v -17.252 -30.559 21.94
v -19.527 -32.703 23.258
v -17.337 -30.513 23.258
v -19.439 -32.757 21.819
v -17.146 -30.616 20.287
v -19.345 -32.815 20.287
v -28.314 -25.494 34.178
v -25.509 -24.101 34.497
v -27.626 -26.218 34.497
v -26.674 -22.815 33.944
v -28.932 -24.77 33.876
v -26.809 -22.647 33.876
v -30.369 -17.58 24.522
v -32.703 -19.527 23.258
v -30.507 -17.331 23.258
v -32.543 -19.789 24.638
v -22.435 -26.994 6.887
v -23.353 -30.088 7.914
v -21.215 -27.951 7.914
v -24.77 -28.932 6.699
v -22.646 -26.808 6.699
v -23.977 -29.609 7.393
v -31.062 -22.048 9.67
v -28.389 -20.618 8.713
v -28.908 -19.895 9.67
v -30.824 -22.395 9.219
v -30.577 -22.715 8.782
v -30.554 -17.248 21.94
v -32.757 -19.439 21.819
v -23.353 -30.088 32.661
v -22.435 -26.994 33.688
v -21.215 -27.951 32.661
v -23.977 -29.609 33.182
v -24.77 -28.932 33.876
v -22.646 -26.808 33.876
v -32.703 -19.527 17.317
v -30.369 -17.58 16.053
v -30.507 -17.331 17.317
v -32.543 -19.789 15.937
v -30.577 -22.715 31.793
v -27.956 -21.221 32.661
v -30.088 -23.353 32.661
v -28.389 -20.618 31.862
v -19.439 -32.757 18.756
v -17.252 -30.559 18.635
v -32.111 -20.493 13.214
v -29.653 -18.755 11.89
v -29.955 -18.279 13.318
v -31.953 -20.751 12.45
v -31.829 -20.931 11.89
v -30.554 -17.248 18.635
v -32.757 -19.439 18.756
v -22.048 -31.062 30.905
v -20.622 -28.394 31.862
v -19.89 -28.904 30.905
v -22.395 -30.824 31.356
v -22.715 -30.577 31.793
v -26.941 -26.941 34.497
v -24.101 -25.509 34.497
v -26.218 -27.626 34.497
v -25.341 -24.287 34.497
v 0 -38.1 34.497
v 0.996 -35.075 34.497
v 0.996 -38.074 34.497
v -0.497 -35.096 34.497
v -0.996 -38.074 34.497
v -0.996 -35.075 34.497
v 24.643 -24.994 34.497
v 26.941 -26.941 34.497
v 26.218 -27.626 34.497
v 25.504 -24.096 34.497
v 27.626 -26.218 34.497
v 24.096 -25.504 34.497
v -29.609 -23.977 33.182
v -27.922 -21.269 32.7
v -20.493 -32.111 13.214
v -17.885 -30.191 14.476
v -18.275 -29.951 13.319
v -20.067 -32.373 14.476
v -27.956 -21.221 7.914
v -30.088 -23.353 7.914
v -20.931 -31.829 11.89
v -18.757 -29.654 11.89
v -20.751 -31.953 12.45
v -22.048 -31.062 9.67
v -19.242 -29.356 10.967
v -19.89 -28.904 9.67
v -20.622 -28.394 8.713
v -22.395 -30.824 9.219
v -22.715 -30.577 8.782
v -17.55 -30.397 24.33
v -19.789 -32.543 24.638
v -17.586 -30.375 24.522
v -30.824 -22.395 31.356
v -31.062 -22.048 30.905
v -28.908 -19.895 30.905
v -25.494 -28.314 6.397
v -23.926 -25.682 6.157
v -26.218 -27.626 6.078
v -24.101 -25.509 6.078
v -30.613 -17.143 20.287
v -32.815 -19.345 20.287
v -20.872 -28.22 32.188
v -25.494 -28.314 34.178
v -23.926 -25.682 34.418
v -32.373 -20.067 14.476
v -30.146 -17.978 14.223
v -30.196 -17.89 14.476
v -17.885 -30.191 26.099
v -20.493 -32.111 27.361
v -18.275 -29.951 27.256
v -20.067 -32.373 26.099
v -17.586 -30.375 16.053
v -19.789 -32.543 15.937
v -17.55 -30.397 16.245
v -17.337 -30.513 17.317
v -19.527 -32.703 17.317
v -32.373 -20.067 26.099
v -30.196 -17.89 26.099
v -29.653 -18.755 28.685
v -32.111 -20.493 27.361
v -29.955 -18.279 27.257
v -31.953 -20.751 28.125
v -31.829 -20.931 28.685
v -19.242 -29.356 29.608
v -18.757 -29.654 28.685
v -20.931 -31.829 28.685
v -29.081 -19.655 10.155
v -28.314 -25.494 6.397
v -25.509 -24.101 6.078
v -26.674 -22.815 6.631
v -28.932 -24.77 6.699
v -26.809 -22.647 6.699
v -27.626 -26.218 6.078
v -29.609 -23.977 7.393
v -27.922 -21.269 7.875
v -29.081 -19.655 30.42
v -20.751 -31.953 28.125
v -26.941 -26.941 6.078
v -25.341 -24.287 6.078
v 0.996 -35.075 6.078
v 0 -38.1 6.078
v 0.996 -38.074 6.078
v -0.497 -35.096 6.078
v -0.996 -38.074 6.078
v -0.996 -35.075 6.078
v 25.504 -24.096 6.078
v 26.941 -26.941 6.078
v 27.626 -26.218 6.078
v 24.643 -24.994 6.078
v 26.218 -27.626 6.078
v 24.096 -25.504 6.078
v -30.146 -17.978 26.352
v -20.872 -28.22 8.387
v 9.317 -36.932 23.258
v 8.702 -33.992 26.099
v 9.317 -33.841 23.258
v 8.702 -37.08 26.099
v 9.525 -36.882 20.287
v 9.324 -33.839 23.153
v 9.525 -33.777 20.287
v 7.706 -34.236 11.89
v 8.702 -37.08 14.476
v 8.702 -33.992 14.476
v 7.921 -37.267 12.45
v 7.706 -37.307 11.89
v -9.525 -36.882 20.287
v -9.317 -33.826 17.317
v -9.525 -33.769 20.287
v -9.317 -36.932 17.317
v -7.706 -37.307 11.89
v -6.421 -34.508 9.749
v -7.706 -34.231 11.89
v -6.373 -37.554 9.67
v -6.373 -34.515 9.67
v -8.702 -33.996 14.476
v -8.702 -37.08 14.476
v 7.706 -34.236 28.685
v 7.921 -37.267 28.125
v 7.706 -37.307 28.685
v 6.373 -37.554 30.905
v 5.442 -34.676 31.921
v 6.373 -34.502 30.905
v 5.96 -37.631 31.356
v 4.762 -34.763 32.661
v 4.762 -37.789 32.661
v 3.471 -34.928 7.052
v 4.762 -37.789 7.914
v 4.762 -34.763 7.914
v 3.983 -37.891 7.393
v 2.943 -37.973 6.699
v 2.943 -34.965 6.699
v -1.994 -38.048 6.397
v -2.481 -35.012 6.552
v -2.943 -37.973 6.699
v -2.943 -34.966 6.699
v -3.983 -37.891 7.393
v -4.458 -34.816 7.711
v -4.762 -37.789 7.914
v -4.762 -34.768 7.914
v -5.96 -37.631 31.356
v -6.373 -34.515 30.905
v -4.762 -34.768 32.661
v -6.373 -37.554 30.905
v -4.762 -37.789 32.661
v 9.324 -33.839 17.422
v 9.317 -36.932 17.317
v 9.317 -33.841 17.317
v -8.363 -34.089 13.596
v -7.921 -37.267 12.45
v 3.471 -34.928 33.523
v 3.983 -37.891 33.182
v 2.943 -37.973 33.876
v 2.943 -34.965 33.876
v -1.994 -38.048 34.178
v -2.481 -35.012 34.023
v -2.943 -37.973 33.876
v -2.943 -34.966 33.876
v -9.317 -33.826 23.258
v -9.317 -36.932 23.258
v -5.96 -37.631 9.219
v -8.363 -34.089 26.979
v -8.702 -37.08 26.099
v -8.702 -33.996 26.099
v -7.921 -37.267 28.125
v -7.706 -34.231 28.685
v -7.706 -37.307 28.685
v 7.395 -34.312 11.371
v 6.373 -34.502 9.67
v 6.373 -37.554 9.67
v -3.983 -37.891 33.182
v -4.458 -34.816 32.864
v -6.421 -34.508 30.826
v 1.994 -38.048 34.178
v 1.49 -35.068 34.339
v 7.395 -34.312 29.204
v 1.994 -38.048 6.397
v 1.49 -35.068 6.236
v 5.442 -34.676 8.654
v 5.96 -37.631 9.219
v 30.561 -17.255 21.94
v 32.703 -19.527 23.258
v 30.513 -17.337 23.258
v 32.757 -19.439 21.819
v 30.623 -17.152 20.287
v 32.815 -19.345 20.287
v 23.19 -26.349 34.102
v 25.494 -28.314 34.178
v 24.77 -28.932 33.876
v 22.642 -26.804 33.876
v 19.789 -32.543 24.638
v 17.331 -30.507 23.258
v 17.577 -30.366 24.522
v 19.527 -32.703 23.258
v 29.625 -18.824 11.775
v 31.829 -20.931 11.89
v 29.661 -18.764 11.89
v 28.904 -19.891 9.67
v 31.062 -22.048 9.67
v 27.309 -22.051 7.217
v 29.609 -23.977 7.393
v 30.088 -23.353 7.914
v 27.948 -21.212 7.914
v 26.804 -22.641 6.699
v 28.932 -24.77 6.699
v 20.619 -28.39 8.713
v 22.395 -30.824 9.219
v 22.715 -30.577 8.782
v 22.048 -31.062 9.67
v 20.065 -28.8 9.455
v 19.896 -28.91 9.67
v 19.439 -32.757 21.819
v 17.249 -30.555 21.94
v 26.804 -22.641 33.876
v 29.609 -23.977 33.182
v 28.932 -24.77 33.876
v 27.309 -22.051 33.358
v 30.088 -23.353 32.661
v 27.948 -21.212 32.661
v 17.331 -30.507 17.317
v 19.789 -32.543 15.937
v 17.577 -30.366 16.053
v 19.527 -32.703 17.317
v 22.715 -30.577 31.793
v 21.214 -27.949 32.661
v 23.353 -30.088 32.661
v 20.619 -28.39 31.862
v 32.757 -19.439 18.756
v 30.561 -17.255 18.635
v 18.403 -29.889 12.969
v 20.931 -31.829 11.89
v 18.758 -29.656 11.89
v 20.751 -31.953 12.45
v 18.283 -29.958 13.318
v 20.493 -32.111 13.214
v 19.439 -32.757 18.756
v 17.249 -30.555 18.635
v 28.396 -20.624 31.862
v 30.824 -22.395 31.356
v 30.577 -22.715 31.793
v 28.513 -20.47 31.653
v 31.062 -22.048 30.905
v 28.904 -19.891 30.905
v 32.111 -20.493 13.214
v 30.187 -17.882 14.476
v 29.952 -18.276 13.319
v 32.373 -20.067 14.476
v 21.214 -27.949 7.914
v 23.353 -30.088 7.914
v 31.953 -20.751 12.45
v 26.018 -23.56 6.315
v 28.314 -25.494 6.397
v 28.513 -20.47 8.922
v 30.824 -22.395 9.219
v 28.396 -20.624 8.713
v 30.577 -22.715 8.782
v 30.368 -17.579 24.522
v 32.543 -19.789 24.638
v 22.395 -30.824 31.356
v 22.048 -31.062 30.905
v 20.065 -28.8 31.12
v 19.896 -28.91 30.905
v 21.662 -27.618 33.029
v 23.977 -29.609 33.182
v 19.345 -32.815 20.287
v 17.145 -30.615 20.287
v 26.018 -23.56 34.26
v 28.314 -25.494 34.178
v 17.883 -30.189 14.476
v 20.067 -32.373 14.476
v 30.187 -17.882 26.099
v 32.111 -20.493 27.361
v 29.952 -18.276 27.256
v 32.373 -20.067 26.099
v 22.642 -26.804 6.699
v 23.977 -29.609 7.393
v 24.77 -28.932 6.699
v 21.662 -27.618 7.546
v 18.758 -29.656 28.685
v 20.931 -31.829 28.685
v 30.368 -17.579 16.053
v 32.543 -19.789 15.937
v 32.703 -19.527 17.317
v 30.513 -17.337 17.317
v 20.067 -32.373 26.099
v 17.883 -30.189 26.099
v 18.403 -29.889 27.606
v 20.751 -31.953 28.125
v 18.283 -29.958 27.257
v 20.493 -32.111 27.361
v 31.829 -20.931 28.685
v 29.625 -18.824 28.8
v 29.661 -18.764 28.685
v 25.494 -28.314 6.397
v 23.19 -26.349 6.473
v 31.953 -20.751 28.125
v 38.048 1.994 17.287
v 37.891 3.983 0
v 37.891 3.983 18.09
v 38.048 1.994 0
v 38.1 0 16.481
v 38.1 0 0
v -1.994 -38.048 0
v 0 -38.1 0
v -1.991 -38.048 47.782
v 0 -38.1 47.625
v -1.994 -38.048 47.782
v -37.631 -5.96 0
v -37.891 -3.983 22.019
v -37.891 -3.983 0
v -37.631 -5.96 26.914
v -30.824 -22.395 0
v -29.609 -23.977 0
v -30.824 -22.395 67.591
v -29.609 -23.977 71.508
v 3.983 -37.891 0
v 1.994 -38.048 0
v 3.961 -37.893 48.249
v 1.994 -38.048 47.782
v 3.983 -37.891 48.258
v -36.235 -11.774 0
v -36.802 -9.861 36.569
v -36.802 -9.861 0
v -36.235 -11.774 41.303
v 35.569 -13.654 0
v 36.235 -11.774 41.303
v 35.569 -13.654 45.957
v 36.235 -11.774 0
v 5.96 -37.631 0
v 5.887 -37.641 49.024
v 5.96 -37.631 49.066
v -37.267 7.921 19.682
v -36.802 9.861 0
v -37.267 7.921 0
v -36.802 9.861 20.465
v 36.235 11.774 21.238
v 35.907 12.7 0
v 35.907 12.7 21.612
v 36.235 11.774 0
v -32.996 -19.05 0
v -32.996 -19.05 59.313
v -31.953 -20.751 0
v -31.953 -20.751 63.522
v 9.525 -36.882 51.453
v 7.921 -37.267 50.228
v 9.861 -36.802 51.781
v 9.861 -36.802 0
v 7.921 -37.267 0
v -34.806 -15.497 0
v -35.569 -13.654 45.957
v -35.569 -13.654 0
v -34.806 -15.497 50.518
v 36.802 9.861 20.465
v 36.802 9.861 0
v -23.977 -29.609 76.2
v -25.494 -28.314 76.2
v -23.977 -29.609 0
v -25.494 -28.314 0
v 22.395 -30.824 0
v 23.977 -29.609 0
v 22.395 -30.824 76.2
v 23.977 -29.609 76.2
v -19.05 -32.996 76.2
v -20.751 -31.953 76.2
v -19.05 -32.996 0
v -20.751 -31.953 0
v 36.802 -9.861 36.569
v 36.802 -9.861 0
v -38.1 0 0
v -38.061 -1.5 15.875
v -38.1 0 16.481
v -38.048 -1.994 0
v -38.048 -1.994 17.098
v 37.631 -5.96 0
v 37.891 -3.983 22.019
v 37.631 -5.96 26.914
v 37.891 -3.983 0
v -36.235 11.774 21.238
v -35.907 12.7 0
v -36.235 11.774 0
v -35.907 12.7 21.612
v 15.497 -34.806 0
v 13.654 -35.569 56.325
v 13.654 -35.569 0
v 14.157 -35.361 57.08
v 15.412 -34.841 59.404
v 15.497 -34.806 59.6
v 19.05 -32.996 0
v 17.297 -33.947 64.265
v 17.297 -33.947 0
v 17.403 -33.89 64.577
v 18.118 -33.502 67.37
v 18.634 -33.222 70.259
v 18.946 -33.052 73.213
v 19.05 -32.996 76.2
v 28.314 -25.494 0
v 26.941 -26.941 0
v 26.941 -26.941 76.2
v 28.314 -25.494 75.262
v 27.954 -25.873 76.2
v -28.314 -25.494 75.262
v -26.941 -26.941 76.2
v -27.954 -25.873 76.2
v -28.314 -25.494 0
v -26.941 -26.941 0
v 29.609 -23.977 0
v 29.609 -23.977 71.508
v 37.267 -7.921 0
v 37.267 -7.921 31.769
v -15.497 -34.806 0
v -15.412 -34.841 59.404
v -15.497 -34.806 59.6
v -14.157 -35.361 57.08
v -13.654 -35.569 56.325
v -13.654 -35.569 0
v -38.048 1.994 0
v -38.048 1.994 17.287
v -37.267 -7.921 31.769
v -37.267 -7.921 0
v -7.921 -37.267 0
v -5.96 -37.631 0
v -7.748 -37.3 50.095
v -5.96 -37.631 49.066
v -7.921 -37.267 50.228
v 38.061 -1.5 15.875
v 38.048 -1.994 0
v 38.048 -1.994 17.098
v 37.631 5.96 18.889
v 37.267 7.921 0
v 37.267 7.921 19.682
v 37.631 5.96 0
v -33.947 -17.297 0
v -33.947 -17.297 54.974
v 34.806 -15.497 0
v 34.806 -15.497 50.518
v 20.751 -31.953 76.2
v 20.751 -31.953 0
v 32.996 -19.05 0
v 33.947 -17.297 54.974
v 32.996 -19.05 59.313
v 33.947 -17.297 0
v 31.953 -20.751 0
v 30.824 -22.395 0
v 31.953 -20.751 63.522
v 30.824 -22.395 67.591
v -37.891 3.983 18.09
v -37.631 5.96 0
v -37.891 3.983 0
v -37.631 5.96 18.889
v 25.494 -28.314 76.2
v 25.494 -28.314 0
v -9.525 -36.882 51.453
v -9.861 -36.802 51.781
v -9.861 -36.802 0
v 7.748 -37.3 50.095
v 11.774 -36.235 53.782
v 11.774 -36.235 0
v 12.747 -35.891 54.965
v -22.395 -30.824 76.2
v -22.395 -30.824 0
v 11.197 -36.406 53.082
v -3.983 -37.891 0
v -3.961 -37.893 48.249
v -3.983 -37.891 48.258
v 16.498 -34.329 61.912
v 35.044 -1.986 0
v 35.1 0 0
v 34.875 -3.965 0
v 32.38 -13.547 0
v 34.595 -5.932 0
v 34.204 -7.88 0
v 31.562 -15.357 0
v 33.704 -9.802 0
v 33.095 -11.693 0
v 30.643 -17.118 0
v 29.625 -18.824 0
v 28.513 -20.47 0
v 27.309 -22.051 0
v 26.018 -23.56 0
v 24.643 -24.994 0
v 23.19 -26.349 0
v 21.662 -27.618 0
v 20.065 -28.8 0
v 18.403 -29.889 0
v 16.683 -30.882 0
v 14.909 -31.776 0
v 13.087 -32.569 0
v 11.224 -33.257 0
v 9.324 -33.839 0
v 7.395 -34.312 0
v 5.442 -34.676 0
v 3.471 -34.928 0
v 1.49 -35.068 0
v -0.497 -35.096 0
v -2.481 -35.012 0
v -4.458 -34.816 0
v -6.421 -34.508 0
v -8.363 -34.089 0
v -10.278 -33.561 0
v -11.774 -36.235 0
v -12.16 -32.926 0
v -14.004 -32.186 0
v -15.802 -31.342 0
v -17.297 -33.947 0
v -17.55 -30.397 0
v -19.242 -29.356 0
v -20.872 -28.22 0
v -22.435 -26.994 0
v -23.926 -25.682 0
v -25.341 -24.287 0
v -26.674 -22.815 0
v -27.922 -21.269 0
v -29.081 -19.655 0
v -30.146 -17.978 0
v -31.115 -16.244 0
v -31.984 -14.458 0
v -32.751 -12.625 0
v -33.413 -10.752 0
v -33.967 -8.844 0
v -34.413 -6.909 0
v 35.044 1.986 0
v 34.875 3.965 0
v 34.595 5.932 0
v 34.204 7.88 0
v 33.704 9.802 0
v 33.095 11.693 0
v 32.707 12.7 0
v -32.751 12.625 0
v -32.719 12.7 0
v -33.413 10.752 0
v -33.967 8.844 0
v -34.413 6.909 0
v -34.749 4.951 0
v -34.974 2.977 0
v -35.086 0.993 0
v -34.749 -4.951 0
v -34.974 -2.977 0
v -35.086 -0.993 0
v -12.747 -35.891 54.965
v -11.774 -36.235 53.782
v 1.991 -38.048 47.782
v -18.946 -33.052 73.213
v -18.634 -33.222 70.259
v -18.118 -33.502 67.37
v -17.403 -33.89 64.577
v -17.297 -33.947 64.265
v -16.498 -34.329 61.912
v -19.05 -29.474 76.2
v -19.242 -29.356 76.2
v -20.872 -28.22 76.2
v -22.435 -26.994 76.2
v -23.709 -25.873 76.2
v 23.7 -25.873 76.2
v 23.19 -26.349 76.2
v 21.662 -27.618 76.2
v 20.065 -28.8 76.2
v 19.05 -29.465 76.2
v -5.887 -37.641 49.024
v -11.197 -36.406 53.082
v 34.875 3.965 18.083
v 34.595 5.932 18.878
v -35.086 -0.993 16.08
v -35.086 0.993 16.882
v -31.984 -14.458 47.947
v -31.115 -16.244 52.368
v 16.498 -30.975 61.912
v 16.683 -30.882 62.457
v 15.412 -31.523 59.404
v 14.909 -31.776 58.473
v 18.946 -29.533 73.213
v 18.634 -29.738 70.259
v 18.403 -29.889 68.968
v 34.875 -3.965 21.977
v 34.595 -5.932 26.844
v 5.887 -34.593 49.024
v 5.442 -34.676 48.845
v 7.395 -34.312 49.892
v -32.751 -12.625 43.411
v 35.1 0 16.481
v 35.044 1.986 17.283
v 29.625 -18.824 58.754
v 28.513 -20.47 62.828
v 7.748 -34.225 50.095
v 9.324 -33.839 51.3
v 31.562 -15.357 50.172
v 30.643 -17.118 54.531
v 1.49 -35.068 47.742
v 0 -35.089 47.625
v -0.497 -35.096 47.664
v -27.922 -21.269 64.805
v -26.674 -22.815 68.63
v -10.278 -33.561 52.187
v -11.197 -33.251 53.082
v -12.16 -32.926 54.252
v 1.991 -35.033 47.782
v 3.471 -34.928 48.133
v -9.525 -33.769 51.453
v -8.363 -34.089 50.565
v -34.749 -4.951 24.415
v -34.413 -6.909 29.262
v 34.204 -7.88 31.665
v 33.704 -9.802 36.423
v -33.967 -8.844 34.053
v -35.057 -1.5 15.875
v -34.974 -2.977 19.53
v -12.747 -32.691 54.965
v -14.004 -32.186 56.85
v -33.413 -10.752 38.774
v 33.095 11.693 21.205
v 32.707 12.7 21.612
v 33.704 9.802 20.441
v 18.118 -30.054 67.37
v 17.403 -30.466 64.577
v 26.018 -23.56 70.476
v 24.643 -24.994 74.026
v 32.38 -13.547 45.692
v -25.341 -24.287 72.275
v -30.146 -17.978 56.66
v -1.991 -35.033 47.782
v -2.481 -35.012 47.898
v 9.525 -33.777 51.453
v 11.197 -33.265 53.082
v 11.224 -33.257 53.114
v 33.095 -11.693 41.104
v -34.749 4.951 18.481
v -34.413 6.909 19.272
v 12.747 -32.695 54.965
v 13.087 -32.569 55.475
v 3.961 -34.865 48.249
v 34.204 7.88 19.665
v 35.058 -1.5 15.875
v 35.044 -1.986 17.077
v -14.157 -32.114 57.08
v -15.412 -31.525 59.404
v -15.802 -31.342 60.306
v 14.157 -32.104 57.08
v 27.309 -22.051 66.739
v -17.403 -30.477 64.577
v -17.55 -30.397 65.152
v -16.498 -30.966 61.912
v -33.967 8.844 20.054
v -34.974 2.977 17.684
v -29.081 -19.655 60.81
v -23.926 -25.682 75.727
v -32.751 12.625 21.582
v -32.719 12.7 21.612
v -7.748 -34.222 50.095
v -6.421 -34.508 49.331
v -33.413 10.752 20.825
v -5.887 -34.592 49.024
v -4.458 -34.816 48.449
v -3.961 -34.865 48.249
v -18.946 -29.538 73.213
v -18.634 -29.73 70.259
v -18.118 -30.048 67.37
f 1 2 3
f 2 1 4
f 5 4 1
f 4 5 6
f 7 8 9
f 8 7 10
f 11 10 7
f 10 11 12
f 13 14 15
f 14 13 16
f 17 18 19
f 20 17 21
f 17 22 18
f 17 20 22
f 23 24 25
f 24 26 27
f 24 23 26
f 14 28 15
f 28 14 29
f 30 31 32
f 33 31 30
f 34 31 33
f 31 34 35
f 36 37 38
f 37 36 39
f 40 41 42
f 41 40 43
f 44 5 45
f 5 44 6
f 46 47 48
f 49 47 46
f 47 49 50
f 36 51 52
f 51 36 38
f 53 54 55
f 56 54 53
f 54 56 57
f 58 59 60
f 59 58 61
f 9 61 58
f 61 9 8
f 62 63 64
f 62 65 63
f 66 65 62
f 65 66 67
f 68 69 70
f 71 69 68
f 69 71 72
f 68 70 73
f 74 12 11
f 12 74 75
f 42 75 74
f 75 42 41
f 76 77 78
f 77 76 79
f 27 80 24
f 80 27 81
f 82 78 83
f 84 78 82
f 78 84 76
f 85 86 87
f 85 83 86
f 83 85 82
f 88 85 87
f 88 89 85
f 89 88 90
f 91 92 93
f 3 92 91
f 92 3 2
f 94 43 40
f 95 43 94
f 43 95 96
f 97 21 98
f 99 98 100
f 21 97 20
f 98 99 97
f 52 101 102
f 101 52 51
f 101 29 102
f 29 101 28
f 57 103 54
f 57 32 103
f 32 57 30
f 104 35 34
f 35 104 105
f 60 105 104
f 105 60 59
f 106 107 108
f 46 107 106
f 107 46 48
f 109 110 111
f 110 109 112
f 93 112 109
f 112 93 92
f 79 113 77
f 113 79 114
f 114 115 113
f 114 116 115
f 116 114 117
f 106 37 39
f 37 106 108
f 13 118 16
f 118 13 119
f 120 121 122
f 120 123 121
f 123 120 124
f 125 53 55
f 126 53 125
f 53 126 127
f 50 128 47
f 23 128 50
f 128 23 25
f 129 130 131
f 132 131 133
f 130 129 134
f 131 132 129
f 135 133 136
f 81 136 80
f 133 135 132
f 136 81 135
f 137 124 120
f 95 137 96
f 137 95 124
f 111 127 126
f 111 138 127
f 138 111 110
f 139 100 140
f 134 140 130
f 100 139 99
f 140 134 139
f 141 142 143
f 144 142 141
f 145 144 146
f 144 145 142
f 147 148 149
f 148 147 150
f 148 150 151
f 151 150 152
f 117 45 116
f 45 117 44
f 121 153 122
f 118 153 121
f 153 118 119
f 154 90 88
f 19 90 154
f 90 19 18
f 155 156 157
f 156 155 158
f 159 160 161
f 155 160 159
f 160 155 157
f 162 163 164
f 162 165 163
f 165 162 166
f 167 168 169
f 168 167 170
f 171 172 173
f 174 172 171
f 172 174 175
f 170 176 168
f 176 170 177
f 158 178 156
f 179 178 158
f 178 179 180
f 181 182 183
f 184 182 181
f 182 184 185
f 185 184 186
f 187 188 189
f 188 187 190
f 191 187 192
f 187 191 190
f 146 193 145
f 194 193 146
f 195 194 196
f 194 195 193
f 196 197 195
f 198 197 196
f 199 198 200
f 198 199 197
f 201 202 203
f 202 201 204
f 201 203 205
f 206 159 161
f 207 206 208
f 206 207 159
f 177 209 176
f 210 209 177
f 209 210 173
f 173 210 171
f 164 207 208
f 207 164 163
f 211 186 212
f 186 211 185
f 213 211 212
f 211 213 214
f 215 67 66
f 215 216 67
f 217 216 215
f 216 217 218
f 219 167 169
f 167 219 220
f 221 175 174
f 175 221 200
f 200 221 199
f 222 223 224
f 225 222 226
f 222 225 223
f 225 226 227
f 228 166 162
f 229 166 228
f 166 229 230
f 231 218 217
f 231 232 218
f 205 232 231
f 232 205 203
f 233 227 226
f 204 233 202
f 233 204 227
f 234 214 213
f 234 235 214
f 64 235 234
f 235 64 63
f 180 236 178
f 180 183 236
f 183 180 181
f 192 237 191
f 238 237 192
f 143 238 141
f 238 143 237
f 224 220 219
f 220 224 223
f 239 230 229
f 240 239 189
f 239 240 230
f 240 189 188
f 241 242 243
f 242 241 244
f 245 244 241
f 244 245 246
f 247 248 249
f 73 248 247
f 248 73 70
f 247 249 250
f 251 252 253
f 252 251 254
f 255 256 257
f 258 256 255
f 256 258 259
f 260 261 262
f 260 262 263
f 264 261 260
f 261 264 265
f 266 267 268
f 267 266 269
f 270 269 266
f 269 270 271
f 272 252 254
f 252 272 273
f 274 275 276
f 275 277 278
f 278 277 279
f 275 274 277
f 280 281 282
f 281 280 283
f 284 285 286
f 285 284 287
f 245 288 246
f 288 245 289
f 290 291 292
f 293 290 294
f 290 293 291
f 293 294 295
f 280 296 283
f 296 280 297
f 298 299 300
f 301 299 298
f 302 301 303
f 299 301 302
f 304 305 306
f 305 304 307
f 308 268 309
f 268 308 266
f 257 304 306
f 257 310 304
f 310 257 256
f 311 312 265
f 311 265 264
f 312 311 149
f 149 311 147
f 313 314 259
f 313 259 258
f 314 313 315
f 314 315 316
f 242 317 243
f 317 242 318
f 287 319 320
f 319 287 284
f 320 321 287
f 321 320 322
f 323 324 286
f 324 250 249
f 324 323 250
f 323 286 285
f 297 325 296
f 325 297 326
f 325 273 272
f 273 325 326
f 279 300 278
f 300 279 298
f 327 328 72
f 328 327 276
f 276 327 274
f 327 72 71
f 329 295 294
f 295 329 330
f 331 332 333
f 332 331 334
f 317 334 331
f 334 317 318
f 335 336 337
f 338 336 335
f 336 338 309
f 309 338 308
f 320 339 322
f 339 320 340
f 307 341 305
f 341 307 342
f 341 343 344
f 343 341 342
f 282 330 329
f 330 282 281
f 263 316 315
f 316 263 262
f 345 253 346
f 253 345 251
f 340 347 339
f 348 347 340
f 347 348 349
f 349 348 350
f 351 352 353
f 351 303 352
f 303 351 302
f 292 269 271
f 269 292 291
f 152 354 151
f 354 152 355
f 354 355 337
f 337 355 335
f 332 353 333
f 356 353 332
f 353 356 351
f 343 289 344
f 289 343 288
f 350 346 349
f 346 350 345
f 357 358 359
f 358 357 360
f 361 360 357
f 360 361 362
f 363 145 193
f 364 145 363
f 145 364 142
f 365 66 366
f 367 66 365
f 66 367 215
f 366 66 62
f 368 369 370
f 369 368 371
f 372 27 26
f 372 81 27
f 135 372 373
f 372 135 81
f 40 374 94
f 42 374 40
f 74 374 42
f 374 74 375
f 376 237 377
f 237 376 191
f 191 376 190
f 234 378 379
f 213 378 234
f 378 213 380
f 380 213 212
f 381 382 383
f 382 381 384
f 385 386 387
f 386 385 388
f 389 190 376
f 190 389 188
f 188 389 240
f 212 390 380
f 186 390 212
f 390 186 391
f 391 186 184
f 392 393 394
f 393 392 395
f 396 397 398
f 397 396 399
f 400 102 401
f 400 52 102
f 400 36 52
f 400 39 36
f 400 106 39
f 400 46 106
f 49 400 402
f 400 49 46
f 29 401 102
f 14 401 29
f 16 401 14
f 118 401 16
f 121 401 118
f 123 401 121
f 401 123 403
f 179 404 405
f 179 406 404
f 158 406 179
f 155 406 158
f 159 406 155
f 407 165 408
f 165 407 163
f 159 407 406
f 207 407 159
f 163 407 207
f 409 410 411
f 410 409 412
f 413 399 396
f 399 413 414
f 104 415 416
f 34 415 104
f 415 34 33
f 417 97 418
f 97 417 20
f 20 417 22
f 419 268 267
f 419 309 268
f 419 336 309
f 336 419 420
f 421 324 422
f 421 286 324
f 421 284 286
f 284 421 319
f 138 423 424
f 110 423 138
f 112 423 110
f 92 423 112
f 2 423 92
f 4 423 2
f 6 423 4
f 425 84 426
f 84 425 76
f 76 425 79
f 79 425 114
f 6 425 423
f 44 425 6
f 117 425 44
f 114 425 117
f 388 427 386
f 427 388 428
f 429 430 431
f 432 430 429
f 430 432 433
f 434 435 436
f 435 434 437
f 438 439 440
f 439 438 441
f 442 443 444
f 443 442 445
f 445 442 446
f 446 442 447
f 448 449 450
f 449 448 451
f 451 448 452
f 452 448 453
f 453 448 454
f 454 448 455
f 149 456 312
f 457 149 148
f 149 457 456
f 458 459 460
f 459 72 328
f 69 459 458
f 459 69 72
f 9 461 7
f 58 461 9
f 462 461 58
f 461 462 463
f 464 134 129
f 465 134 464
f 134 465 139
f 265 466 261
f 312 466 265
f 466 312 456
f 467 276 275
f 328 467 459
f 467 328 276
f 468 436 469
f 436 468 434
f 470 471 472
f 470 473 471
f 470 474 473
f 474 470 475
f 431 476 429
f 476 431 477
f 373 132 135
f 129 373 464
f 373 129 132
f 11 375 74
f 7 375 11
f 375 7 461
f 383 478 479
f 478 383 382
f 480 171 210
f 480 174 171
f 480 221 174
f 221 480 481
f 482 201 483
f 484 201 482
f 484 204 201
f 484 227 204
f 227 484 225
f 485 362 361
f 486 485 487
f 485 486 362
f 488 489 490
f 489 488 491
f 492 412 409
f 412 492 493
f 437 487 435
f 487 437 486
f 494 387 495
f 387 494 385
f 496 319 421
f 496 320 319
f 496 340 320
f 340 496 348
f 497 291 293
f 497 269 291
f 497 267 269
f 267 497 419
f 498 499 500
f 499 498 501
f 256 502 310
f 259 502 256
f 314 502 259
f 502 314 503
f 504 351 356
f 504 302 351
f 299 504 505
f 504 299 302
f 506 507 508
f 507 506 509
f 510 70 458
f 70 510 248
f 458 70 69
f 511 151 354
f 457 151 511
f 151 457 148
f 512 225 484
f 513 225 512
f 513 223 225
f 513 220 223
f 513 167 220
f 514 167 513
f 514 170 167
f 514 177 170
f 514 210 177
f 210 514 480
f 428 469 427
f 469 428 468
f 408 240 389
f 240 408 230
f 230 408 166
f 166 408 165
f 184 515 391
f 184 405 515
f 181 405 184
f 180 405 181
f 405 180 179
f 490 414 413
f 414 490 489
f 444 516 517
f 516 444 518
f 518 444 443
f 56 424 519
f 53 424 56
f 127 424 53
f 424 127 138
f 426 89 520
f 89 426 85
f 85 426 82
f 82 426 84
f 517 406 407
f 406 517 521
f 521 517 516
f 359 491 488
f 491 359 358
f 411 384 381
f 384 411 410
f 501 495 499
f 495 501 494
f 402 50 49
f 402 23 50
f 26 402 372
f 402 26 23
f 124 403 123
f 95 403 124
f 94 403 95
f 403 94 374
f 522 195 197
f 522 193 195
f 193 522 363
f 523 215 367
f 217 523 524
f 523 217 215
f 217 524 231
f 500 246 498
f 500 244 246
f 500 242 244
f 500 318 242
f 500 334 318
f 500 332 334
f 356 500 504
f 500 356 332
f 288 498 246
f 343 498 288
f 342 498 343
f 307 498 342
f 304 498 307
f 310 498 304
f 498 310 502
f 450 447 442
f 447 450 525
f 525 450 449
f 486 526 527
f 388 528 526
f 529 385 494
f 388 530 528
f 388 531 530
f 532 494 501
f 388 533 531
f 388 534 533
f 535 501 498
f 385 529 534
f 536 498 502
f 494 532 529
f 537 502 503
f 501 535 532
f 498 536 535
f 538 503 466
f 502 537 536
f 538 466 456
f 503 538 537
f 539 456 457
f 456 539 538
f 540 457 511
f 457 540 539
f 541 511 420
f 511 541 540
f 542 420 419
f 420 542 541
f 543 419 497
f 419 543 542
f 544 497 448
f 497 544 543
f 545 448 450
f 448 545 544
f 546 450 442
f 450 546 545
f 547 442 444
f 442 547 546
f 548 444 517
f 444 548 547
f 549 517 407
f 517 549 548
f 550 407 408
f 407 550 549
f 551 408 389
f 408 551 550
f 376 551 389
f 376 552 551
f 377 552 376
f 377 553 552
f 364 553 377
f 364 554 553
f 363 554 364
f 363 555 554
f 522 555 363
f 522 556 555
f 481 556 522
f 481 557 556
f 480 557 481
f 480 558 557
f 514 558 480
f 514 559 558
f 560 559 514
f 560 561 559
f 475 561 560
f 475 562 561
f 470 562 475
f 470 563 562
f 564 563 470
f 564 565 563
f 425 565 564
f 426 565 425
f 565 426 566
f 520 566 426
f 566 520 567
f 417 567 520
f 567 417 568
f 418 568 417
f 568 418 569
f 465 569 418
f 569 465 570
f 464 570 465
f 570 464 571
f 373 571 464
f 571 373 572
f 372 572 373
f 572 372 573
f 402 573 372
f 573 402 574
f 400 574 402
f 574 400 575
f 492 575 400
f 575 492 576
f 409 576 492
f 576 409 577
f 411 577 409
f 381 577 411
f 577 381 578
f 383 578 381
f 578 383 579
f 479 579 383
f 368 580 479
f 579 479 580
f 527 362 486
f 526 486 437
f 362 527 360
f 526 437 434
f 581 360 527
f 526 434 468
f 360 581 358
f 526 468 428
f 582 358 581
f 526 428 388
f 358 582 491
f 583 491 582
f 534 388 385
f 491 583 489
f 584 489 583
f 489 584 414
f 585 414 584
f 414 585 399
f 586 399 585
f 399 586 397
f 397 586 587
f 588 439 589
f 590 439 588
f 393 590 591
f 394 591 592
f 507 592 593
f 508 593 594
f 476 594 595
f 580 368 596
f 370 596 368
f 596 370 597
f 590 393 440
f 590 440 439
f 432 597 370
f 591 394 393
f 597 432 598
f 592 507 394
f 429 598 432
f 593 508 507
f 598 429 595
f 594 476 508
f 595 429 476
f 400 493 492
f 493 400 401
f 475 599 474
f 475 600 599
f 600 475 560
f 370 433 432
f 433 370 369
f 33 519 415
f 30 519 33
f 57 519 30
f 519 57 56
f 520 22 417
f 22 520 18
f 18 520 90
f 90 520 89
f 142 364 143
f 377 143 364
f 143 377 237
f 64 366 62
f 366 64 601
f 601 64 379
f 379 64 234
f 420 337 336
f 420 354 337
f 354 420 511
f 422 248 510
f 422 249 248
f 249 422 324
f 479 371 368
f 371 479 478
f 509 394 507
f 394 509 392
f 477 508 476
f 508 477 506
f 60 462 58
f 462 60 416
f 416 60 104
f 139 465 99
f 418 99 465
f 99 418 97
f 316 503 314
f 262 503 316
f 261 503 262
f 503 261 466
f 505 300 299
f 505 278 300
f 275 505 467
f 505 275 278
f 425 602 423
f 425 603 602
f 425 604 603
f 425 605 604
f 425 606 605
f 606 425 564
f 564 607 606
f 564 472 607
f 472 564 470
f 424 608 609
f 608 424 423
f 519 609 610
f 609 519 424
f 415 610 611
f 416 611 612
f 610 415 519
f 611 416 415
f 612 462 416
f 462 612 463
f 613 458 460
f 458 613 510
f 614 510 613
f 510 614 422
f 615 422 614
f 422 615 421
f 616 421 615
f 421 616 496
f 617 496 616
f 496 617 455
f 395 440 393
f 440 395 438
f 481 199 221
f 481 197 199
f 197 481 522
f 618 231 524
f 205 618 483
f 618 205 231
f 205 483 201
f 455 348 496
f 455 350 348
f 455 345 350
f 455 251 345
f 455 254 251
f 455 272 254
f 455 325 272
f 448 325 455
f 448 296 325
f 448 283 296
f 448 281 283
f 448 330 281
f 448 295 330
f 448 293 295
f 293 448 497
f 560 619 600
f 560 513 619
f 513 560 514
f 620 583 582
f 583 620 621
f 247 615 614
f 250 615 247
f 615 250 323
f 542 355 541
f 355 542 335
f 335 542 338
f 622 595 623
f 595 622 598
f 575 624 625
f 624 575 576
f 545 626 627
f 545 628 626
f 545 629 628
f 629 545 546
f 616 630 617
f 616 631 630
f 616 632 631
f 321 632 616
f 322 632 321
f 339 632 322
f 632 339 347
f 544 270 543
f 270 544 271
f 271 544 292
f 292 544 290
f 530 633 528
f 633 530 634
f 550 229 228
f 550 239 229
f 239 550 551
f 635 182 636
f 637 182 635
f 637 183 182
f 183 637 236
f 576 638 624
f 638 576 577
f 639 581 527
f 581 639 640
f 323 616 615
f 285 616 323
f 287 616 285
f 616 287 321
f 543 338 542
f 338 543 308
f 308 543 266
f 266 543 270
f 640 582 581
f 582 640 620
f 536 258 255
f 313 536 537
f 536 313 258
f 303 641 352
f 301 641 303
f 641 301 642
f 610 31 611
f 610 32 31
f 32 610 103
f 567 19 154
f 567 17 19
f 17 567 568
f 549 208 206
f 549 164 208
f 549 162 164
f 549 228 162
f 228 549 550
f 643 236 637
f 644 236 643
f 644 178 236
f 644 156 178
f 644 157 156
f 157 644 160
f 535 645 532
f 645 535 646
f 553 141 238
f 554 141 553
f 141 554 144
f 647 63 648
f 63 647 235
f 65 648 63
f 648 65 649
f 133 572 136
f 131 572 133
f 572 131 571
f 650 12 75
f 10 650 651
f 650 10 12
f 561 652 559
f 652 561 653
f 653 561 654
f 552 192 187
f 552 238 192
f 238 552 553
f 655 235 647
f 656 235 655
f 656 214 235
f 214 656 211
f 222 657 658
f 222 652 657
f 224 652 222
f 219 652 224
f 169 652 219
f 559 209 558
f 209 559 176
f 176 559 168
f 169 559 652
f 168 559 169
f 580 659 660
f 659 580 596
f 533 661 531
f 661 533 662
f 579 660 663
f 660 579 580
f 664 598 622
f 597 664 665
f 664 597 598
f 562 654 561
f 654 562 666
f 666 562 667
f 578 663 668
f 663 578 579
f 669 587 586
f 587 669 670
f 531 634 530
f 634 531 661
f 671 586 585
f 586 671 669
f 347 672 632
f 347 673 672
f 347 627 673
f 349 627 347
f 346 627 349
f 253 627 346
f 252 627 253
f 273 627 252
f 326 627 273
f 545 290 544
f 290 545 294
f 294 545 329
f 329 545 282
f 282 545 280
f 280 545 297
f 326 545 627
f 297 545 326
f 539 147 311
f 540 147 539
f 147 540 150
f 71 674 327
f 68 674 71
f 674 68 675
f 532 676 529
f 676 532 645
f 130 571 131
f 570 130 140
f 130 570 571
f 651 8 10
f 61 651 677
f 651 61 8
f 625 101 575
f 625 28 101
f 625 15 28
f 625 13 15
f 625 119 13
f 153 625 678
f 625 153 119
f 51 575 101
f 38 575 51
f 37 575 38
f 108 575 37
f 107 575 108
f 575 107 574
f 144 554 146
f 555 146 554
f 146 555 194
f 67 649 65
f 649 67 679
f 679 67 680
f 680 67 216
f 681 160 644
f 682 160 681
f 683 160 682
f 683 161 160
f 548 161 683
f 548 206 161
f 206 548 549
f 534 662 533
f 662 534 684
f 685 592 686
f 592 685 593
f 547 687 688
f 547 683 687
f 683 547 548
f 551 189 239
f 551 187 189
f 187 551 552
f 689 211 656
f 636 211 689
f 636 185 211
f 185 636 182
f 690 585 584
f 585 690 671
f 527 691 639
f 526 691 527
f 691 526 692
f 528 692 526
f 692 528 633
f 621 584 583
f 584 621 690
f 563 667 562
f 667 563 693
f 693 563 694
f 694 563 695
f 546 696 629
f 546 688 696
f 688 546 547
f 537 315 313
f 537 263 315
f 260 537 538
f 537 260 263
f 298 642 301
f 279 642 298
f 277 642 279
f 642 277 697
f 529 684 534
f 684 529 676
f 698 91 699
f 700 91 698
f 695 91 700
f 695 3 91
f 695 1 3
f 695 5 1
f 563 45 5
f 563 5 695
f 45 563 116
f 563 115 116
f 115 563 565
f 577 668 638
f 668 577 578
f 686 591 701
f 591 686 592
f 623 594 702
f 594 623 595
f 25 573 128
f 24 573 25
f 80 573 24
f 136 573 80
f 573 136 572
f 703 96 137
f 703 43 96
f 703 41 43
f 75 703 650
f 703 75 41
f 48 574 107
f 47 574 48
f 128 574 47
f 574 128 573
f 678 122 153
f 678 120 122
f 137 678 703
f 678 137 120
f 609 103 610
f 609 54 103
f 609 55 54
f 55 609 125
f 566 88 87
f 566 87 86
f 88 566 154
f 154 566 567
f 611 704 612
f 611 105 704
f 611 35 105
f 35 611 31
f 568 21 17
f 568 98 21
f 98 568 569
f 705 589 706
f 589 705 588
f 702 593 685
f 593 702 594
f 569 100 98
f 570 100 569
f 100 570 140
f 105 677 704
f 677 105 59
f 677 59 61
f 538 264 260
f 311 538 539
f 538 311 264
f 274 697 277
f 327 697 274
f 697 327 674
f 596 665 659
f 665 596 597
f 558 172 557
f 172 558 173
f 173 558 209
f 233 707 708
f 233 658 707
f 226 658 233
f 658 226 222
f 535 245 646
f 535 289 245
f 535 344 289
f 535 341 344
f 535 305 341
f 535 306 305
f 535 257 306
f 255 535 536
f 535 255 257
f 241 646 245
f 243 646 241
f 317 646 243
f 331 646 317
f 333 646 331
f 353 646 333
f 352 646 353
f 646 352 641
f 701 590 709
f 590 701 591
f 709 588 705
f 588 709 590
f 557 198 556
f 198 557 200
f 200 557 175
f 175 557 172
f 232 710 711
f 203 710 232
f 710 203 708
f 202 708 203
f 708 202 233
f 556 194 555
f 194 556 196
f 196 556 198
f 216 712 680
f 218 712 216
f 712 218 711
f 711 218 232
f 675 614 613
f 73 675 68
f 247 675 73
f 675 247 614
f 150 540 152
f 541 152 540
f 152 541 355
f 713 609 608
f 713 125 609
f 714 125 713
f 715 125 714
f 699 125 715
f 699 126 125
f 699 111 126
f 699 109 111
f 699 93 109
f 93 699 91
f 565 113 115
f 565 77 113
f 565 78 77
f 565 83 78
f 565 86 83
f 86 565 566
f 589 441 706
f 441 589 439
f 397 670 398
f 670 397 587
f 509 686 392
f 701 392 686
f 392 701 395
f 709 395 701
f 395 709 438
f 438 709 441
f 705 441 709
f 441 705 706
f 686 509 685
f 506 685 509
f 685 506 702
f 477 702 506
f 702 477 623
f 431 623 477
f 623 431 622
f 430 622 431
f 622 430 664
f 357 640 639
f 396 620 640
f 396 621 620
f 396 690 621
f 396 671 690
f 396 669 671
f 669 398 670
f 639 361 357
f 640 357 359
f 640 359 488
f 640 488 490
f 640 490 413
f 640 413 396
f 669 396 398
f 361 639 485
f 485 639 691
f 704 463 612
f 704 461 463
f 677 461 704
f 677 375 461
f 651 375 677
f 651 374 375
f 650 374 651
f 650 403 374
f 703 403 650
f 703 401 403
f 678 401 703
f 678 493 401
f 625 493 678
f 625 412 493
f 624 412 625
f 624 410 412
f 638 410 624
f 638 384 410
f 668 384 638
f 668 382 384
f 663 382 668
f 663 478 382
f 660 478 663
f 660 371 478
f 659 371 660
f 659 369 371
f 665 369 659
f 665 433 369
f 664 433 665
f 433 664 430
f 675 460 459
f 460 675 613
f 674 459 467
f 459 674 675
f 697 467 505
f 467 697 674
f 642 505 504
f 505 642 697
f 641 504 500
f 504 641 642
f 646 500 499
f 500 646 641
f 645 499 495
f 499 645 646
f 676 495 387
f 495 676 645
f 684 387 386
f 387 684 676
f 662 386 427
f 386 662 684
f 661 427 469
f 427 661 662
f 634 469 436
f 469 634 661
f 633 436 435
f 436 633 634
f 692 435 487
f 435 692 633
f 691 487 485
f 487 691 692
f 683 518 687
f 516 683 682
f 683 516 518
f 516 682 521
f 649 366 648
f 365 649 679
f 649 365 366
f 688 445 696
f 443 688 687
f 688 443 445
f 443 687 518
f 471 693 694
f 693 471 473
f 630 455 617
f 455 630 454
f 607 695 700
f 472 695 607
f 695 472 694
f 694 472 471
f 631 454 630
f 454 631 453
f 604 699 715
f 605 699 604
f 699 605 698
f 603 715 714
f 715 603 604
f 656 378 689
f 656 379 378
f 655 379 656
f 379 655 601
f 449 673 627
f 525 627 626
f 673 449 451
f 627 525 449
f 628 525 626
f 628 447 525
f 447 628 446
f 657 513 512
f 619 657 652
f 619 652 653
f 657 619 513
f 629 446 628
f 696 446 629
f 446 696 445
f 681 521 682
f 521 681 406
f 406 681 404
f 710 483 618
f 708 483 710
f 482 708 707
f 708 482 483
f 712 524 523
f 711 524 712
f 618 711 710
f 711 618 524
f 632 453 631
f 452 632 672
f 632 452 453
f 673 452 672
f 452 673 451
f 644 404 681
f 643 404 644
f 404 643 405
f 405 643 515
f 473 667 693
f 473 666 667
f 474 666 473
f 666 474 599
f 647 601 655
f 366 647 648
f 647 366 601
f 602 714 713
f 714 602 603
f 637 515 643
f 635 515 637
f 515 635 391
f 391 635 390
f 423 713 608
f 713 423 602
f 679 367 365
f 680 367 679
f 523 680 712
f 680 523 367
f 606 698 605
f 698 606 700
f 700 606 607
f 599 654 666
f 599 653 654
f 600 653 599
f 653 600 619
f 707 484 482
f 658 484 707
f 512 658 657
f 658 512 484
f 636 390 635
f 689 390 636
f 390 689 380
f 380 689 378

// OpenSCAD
//Title: Slad Display Stand
//Author: Alex English - ProtoParadigm
//Date: 8/5/16
//License: Creative Commons - Share Alike - Attribution

//Notes: This stand is made to display slabs of finished stone.
//  While the design is parametric, it has not been tested with a wide range of values. If you want to change it dramatically you will probably need to make other edits to the code.

IN=25.4*1; //multiplication by 1 to prevent customizer from presenting this as a configurable value

//Width of the whole stand (in inches)
width=3;
w=IN*width;

//Height of the stand (in inches)
height=3;
h=IN*height; //full height

//Thickness of the walls (in mm)
thickness=3;
t = thickness;

//The height from the bottom of the shelf the slab rests on (in inches)
shelf_height = 0.625;
b=shelf_height*IN;

//The angle (degrees) of the face the slab rests against - you probably don't want to adjust this much
angle = 22;
a=angle*1;

//The distance the shelf is inset, this determines the width of the shelf the slab rests on
inset = 0.5;
s=inset*IN; //the width of the shelf on the front legs where the slab is held

//Turn the holes in the back on or off - both for aesthetics and material savings
holes=1; //[1:On, 0:Off]

module roundstand()
{
    difference()
    {
        cylinder(d=w, h=h, $fa=1); //outer cylinder
        
        translate([0, 0, -1]) cylinder(d=w-t*2, h=h+2, $fa=2); //inner cylinder cutout to hollow the main body
        
        translate([-w, s, -1]) cube([w*2,w, h+2]); //cut the front off of the cylinders
        
        translate([0, -t/2, b])  rotate([a, 0, 0])   translate([-w, 0, 0]) cube([w*2, w, h]); //front cutout for shelf
        
        //cutouts for aesthetics, to reduce material usage, and to balance the weight of the stand further towards the front
        translate([0, 0, h]) scale([1, 1, 1.5]) rotate([90, 0, 0]) cylinder(d=h/2,h=w, $fa=6); //top cutout
        if(holes) {for(r=[-45, 0, 45]) translate([0, 0, h/4/2*1.5+t*2]) scale([1, 1, 1.5]) rotate([90, 0, r]) cylinder(d=h/4, h=w, $fa=6); }//back wall cutouts
    }
}

roundstand();
